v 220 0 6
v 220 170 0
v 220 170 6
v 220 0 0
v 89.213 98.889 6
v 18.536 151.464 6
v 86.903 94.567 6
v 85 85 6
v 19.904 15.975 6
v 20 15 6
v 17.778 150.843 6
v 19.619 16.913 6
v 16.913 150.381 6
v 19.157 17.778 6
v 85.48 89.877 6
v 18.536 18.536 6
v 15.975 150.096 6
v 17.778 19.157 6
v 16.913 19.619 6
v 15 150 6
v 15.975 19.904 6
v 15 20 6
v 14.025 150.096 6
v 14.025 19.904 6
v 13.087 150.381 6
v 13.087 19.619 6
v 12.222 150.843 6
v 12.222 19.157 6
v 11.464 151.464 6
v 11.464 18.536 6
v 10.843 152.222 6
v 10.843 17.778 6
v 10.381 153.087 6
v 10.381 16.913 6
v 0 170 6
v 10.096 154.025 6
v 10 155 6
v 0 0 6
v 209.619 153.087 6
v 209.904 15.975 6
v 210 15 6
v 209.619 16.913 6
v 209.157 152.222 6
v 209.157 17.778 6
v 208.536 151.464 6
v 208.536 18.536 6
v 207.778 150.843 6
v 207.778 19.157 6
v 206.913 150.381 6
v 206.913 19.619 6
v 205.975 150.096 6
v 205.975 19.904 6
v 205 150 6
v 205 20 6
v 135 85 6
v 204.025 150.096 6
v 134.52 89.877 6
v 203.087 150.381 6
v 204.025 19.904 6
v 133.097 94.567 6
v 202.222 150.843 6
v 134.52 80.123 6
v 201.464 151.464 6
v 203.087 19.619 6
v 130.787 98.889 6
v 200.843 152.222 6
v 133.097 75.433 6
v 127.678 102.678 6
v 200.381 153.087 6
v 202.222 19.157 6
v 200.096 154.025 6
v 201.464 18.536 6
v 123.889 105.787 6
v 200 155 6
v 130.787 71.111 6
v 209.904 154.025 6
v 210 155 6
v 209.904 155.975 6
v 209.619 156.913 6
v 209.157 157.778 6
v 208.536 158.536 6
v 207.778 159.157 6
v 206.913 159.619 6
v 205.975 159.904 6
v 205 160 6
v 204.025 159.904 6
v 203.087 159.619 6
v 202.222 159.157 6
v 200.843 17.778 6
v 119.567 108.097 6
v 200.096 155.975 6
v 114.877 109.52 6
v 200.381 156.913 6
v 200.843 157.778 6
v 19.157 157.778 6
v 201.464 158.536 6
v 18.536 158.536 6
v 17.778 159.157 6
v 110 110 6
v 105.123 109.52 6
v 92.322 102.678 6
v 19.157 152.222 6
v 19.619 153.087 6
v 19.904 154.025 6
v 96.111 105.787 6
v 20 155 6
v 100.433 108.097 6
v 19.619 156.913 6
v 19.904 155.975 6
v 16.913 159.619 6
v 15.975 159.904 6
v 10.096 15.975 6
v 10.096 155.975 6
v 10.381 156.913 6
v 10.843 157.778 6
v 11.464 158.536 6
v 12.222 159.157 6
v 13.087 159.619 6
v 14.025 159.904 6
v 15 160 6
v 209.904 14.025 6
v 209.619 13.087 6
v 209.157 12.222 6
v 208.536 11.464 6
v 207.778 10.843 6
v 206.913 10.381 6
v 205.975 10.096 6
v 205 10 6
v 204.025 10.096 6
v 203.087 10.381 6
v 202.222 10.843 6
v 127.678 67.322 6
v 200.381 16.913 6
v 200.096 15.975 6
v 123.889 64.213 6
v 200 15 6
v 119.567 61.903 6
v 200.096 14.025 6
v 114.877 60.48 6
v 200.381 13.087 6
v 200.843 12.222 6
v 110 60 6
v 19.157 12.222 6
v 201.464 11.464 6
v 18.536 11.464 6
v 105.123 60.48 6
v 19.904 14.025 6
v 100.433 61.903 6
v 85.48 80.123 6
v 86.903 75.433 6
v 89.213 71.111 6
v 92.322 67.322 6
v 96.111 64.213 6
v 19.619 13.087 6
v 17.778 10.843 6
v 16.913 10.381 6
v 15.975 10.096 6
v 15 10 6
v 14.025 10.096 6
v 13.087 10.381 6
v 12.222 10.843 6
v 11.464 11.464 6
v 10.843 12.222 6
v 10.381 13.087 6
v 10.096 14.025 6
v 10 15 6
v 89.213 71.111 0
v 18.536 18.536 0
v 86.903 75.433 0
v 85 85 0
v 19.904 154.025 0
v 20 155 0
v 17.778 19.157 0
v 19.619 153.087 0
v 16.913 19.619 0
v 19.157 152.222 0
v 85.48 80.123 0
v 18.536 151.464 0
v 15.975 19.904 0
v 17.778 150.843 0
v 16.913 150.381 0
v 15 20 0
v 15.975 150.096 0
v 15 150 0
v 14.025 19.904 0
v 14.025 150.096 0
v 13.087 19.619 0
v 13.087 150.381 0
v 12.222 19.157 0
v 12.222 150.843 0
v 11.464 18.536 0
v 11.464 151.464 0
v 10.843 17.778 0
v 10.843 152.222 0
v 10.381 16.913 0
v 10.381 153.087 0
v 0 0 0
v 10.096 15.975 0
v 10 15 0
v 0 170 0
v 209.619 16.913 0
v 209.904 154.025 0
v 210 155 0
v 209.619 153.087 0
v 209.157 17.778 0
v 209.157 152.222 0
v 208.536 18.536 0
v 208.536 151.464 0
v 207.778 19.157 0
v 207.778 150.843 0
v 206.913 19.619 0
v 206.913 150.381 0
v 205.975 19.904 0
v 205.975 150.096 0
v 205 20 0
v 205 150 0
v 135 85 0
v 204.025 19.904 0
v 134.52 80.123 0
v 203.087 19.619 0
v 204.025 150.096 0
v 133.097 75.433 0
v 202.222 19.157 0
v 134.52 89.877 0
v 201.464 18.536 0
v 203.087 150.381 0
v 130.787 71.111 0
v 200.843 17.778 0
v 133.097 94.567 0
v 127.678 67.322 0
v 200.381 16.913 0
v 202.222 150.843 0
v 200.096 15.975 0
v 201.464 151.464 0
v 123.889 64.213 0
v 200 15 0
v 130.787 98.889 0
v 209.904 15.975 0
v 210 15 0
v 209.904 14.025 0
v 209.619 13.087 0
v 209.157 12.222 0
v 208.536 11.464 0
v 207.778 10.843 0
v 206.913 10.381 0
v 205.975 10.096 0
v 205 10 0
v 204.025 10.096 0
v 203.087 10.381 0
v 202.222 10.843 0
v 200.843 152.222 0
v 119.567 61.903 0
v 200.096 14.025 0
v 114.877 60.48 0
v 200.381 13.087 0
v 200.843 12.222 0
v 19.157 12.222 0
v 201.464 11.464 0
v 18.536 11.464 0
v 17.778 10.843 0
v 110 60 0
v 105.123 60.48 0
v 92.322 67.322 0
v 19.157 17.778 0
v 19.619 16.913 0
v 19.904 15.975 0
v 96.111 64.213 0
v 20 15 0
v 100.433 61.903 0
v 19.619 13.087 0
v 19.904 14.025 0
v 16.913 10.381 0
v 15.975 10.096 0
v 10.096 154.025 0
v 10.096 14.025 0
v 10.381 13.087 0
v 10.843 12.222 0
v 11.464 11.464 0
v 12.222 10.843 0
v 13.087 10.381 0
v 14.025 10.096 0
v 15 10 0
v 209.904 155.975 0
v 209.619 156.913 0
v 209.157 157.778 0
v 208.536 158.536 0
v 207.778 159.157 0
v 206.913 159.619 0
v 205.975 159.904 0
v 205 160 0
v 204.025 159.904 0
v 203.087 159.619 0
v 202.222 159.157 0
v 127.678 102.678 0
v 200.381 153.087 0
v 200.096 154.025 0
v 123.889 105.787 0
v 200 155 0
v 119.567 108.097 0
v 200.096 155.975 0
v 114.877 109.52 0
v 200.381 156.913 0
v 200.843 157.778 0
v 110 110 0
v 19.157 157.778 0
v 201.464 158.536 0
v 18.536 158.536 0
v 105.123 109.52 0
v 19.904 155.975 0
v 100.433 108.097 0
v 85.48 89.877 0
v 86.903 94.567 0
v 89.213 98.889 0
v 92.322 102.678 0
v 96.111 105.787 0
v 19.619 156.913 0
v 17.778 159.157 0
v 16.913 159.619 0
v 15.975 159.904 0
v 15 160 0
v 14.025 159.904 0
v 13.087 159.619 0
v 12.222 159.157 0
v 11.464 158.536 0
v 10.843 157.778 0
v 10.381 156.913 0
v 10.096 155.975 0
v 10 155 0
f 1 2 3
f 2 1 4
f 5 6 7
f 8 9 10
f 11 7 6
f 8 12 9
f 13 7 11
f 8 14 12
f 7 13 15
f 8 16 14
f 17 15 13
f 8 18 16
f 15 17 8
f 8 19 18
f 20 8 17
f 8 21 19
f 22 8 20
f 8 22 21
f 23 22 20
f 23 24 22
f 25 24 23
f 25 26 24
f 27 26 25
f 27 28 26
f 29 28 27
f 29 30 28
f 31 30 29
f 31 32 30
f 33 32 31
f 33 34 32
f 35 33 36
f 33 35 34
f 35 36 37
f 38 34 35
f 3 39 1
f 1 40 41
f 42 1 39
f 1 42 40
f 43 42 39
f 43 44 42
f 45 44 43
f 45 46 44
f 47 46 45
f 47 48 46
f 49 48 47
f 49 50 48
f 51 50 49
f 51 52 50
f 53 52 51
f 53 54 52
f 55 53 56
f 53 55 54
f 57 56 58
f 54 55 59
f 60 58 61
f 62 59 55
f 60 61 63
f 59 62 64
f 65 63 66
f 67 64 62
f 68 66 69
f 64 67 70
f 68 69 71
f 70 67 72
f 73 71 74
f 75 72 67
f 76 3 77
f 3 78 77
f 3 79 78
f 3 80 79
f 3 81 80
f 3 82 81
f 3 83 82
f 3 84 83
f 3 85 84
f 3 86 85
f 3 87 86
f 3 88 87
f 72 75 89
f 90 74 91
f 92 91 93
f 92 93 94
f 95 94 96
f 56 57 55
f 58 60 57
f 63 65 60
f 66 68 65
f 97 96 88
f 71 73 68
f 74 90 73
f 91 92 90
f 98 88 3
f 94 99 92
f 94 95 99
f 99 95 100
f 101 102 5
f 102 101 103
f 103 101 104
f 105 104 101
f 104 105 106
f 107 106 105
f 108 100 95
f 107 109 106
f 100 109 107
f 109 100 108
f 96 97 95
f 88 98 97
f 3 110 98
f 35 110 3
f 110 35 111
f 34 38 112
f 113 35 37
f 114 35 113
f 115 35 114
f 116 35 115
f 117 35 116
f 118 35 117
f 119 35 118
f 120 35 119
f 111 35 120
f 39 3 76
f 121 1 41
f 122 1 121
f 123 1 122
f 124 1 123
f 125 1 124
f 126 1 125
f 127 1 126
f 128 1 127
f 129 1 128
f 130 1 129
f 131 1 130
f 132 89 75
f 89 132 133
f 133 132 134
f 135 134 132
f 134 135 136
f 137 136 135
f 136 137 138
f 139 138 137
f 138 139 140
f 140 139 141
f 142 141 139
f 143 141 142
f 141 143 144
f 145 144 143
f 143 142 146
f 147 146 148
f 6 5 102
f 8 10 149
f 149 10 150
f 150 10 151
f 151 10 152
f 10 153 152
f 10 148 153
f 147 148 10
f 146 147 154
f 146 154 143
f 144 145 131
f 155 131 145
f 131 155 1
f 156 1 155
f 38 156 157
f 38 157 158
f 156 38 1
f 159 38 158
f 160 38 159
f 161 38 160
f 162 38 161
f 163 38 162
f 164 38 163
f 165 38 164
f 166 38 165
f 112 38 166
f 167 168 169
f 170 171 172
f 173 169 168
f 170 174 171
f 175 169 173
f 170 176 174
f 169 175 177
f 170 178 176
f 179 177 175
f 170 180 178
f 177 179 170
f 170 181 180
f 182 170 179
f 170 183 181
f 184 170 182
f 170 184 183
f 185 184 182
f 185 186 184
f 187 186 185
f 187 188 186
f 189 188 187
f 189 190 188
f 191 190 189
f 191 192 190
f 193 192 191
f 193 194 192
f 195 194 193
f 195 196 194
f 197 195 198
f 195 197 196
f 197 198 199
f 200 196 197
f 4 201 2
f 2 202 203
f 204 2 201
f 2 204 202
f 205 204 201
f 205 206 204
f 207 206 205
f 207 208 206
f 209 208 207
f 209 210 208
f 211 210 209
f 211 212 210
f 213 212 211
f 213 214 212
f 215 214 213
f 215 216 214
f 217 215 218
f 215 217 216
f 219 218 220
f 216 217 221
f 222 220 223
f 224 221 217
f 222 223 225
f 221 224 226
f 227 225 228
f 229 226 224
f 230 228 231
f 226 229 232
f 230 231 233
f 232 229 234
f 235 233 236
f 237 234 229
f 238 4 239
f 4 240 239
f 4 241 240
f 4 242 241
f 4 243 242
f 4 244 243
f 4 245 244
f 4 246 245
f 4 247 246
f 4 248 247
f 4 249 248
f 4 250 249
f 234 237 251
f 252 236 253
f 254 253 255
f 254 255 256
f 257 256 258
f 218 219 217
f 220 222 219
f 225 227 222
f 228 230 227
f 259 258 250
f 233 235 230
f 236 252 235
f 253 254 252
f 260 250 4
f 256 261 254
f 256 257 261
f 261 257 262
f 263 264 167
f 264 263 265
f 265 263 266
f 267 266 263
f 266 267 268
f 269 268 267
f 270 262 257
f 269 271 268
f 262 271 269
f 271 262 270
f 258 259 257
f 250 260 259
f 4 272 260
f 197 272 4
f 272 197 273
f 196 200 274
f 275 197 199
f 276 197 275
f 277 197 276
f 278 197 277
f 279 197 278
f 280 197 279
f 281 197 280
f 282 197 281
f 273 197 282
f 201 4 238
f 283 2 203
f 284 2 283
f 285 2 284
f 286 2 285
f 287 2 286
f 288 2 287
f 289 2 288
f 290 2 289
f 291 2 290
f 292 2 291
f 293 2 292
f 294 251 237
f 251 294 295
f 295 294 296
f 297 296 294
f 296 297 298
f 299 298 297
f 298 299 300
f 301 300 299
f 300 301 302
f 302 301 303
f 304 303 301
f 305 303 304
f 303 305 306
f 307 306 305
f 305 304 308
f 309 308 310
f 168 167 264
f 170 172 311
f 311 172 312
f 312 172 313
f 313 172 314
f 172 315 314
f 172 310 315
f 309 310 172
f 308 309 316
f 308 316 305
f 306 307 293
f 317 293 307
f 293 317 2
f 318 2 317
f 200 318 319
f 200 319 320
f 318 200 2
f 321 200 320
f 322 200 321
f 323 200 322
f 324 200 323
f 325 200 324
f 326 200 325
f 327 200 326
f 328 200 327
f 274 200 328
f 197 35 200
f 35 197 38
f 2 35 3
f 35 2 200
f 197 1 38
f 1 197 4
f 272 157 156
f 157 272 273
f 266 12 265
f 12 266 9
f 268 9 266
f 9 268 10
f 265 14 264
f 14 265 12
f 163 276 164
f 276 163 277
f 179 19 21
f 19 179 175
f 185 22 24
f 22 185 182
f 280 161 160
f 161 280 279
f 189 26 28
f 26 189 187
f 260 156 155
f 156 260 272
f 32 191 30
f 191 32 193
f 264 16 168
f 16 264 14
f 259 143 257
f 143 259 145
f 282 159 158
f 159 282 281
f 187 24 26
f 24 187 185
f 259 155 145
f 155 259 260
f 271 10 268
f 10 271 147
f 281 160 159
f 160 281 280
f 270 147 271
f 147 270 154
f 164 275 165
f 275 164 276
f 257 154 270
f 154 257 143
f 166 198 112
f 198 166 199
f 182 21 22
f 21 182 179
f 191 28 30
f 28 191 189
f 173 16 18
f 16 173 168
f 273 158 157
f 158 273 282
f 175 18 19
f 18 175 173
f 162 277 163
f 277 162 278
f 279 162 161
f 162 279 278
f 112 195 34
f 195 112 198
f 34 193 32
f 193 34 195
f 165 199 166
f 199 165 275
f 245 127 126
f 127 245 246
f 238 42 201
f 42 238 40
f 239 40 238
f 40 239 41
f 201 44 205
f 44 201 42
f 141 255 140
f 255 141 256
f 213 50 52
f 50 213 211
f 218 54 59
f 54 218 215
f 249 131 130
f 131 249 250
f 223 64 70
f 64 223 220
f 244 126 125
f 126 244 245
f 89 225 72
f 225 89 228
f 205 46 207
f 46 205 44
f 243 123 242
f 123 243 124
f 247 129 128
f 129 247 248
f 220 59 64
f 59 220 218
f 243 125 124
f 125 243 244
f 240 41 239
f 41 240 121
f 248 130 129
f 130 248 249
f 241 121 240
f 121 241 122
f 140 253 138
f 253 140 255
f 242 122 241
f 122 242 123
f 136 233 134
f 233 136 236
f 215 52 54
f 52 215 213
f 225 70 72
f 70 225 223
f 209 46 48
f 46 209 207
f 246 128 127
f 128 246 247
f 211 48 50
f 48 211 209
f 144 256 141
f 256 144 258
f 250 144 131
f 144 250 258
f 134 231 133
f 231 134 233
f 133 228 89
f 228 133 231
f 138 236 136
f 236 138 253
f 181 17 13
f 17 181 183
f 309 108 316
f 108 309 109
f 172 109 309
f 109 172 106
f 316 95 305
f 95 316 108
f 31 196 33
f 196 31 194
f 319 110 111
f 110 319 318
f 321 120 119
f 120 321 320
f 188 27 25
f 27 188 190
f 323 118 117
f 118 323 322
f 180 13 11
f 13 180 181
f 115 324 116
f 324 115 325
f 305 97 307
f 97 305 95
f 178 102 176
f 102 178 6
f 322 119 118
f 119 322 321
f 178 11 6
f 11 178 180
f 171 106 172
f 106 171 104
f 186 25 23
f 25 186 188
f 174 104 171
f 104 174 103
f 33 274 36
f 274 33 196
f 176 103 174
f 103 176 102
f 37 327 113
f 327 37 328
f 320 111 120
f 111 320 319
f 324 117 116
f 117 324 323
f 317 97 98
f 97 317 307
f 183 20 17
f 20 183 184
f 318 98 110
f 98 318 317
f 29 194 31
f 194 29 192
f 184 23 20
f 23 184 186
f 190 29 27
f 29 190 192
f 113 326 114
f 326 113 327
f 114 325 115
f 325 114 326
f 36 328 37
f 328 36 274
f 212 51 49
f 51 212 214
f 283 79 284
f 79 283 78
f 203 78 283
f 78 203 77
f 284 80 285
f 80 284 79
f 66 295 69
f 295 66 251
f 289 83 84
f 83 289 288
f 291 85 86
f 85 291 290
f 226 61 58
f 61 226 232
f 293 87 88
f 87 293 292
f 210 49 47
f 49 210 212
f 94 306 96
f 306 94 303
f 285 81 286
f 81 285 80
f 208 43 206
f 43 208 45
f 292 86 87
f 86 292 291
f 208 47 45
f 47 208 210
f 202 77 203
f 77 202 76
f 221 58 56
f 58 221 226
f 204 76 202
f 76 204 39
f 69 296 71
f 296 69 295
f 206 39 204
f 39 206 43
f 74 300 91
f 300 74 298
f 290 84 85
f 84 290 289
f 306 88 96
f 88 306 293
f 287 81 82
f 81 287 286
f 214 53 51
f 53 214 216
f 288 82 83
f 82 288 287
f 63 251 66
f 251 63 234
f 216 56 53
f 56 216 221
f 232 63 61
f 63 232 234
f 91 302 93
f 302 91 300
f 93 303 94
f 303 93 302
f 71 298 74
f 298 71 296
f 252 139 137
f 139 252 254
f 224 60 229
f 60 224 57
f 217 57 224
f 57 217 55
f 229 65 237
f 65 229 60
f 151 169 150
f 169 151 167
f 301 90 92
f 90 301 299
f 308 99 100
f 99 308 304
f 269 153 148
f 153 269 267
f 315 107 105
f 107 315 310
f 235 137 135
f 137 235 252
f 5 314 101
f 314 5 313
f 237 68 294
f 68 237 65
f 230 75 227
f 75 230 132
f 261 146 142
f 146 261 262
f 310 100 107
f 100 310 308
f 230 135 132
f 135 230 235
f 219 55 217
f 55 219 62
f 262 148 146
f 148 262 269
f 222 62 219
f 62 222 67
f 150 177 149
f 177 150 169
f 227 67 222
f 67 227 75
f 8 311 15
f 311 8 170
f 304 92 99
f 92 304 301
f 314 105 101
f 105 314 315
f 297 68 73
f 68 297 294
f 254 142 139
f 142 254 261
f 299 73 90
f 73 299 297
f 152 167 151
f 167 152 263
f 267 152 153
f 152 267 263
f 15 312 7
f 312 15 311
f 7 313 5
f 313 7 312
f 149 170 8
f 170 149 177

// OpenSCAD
$fn = 32;

// ----------------------------------------------------------------------
// Big plate: 200-250 mm adapter plate
// ----------------------------------------------------------------------

// --- parameters (mm) ---
plate_l = 220;            // plate length, X
plate_w = 170;            // plate width, Y
plate_t = 6;              // plate thickness, Z
corner_d = 10;            // corner hole diameter
corner_in = 15;           // corner hole inset from the edges
bore_d = 50;              // central bore

difference() {
  cube([plate_l, plate_w, plate_t]);
  translate([corner_in, corner_in, -1]) cylinder(h = plate_t + 2, d = corner_d);
  translate([plate_l - corner_in, corner_in, -1]) cylinder(h = plate_t + 2, d = corner_d);
  translate([corner_in, plate_w - corner_in, -1]) cylinder(h = plate_t + 2, d = corner_d);
  translate([plate_l - corner_in, plate_w - corner_in, -1]) cylinder(h = plate_t + 2, d = corner_d);
  translate([plate_l / 2, plate_w / 2, -1]) cylinder(h = plate_t + 2, d = bore_d);
}
